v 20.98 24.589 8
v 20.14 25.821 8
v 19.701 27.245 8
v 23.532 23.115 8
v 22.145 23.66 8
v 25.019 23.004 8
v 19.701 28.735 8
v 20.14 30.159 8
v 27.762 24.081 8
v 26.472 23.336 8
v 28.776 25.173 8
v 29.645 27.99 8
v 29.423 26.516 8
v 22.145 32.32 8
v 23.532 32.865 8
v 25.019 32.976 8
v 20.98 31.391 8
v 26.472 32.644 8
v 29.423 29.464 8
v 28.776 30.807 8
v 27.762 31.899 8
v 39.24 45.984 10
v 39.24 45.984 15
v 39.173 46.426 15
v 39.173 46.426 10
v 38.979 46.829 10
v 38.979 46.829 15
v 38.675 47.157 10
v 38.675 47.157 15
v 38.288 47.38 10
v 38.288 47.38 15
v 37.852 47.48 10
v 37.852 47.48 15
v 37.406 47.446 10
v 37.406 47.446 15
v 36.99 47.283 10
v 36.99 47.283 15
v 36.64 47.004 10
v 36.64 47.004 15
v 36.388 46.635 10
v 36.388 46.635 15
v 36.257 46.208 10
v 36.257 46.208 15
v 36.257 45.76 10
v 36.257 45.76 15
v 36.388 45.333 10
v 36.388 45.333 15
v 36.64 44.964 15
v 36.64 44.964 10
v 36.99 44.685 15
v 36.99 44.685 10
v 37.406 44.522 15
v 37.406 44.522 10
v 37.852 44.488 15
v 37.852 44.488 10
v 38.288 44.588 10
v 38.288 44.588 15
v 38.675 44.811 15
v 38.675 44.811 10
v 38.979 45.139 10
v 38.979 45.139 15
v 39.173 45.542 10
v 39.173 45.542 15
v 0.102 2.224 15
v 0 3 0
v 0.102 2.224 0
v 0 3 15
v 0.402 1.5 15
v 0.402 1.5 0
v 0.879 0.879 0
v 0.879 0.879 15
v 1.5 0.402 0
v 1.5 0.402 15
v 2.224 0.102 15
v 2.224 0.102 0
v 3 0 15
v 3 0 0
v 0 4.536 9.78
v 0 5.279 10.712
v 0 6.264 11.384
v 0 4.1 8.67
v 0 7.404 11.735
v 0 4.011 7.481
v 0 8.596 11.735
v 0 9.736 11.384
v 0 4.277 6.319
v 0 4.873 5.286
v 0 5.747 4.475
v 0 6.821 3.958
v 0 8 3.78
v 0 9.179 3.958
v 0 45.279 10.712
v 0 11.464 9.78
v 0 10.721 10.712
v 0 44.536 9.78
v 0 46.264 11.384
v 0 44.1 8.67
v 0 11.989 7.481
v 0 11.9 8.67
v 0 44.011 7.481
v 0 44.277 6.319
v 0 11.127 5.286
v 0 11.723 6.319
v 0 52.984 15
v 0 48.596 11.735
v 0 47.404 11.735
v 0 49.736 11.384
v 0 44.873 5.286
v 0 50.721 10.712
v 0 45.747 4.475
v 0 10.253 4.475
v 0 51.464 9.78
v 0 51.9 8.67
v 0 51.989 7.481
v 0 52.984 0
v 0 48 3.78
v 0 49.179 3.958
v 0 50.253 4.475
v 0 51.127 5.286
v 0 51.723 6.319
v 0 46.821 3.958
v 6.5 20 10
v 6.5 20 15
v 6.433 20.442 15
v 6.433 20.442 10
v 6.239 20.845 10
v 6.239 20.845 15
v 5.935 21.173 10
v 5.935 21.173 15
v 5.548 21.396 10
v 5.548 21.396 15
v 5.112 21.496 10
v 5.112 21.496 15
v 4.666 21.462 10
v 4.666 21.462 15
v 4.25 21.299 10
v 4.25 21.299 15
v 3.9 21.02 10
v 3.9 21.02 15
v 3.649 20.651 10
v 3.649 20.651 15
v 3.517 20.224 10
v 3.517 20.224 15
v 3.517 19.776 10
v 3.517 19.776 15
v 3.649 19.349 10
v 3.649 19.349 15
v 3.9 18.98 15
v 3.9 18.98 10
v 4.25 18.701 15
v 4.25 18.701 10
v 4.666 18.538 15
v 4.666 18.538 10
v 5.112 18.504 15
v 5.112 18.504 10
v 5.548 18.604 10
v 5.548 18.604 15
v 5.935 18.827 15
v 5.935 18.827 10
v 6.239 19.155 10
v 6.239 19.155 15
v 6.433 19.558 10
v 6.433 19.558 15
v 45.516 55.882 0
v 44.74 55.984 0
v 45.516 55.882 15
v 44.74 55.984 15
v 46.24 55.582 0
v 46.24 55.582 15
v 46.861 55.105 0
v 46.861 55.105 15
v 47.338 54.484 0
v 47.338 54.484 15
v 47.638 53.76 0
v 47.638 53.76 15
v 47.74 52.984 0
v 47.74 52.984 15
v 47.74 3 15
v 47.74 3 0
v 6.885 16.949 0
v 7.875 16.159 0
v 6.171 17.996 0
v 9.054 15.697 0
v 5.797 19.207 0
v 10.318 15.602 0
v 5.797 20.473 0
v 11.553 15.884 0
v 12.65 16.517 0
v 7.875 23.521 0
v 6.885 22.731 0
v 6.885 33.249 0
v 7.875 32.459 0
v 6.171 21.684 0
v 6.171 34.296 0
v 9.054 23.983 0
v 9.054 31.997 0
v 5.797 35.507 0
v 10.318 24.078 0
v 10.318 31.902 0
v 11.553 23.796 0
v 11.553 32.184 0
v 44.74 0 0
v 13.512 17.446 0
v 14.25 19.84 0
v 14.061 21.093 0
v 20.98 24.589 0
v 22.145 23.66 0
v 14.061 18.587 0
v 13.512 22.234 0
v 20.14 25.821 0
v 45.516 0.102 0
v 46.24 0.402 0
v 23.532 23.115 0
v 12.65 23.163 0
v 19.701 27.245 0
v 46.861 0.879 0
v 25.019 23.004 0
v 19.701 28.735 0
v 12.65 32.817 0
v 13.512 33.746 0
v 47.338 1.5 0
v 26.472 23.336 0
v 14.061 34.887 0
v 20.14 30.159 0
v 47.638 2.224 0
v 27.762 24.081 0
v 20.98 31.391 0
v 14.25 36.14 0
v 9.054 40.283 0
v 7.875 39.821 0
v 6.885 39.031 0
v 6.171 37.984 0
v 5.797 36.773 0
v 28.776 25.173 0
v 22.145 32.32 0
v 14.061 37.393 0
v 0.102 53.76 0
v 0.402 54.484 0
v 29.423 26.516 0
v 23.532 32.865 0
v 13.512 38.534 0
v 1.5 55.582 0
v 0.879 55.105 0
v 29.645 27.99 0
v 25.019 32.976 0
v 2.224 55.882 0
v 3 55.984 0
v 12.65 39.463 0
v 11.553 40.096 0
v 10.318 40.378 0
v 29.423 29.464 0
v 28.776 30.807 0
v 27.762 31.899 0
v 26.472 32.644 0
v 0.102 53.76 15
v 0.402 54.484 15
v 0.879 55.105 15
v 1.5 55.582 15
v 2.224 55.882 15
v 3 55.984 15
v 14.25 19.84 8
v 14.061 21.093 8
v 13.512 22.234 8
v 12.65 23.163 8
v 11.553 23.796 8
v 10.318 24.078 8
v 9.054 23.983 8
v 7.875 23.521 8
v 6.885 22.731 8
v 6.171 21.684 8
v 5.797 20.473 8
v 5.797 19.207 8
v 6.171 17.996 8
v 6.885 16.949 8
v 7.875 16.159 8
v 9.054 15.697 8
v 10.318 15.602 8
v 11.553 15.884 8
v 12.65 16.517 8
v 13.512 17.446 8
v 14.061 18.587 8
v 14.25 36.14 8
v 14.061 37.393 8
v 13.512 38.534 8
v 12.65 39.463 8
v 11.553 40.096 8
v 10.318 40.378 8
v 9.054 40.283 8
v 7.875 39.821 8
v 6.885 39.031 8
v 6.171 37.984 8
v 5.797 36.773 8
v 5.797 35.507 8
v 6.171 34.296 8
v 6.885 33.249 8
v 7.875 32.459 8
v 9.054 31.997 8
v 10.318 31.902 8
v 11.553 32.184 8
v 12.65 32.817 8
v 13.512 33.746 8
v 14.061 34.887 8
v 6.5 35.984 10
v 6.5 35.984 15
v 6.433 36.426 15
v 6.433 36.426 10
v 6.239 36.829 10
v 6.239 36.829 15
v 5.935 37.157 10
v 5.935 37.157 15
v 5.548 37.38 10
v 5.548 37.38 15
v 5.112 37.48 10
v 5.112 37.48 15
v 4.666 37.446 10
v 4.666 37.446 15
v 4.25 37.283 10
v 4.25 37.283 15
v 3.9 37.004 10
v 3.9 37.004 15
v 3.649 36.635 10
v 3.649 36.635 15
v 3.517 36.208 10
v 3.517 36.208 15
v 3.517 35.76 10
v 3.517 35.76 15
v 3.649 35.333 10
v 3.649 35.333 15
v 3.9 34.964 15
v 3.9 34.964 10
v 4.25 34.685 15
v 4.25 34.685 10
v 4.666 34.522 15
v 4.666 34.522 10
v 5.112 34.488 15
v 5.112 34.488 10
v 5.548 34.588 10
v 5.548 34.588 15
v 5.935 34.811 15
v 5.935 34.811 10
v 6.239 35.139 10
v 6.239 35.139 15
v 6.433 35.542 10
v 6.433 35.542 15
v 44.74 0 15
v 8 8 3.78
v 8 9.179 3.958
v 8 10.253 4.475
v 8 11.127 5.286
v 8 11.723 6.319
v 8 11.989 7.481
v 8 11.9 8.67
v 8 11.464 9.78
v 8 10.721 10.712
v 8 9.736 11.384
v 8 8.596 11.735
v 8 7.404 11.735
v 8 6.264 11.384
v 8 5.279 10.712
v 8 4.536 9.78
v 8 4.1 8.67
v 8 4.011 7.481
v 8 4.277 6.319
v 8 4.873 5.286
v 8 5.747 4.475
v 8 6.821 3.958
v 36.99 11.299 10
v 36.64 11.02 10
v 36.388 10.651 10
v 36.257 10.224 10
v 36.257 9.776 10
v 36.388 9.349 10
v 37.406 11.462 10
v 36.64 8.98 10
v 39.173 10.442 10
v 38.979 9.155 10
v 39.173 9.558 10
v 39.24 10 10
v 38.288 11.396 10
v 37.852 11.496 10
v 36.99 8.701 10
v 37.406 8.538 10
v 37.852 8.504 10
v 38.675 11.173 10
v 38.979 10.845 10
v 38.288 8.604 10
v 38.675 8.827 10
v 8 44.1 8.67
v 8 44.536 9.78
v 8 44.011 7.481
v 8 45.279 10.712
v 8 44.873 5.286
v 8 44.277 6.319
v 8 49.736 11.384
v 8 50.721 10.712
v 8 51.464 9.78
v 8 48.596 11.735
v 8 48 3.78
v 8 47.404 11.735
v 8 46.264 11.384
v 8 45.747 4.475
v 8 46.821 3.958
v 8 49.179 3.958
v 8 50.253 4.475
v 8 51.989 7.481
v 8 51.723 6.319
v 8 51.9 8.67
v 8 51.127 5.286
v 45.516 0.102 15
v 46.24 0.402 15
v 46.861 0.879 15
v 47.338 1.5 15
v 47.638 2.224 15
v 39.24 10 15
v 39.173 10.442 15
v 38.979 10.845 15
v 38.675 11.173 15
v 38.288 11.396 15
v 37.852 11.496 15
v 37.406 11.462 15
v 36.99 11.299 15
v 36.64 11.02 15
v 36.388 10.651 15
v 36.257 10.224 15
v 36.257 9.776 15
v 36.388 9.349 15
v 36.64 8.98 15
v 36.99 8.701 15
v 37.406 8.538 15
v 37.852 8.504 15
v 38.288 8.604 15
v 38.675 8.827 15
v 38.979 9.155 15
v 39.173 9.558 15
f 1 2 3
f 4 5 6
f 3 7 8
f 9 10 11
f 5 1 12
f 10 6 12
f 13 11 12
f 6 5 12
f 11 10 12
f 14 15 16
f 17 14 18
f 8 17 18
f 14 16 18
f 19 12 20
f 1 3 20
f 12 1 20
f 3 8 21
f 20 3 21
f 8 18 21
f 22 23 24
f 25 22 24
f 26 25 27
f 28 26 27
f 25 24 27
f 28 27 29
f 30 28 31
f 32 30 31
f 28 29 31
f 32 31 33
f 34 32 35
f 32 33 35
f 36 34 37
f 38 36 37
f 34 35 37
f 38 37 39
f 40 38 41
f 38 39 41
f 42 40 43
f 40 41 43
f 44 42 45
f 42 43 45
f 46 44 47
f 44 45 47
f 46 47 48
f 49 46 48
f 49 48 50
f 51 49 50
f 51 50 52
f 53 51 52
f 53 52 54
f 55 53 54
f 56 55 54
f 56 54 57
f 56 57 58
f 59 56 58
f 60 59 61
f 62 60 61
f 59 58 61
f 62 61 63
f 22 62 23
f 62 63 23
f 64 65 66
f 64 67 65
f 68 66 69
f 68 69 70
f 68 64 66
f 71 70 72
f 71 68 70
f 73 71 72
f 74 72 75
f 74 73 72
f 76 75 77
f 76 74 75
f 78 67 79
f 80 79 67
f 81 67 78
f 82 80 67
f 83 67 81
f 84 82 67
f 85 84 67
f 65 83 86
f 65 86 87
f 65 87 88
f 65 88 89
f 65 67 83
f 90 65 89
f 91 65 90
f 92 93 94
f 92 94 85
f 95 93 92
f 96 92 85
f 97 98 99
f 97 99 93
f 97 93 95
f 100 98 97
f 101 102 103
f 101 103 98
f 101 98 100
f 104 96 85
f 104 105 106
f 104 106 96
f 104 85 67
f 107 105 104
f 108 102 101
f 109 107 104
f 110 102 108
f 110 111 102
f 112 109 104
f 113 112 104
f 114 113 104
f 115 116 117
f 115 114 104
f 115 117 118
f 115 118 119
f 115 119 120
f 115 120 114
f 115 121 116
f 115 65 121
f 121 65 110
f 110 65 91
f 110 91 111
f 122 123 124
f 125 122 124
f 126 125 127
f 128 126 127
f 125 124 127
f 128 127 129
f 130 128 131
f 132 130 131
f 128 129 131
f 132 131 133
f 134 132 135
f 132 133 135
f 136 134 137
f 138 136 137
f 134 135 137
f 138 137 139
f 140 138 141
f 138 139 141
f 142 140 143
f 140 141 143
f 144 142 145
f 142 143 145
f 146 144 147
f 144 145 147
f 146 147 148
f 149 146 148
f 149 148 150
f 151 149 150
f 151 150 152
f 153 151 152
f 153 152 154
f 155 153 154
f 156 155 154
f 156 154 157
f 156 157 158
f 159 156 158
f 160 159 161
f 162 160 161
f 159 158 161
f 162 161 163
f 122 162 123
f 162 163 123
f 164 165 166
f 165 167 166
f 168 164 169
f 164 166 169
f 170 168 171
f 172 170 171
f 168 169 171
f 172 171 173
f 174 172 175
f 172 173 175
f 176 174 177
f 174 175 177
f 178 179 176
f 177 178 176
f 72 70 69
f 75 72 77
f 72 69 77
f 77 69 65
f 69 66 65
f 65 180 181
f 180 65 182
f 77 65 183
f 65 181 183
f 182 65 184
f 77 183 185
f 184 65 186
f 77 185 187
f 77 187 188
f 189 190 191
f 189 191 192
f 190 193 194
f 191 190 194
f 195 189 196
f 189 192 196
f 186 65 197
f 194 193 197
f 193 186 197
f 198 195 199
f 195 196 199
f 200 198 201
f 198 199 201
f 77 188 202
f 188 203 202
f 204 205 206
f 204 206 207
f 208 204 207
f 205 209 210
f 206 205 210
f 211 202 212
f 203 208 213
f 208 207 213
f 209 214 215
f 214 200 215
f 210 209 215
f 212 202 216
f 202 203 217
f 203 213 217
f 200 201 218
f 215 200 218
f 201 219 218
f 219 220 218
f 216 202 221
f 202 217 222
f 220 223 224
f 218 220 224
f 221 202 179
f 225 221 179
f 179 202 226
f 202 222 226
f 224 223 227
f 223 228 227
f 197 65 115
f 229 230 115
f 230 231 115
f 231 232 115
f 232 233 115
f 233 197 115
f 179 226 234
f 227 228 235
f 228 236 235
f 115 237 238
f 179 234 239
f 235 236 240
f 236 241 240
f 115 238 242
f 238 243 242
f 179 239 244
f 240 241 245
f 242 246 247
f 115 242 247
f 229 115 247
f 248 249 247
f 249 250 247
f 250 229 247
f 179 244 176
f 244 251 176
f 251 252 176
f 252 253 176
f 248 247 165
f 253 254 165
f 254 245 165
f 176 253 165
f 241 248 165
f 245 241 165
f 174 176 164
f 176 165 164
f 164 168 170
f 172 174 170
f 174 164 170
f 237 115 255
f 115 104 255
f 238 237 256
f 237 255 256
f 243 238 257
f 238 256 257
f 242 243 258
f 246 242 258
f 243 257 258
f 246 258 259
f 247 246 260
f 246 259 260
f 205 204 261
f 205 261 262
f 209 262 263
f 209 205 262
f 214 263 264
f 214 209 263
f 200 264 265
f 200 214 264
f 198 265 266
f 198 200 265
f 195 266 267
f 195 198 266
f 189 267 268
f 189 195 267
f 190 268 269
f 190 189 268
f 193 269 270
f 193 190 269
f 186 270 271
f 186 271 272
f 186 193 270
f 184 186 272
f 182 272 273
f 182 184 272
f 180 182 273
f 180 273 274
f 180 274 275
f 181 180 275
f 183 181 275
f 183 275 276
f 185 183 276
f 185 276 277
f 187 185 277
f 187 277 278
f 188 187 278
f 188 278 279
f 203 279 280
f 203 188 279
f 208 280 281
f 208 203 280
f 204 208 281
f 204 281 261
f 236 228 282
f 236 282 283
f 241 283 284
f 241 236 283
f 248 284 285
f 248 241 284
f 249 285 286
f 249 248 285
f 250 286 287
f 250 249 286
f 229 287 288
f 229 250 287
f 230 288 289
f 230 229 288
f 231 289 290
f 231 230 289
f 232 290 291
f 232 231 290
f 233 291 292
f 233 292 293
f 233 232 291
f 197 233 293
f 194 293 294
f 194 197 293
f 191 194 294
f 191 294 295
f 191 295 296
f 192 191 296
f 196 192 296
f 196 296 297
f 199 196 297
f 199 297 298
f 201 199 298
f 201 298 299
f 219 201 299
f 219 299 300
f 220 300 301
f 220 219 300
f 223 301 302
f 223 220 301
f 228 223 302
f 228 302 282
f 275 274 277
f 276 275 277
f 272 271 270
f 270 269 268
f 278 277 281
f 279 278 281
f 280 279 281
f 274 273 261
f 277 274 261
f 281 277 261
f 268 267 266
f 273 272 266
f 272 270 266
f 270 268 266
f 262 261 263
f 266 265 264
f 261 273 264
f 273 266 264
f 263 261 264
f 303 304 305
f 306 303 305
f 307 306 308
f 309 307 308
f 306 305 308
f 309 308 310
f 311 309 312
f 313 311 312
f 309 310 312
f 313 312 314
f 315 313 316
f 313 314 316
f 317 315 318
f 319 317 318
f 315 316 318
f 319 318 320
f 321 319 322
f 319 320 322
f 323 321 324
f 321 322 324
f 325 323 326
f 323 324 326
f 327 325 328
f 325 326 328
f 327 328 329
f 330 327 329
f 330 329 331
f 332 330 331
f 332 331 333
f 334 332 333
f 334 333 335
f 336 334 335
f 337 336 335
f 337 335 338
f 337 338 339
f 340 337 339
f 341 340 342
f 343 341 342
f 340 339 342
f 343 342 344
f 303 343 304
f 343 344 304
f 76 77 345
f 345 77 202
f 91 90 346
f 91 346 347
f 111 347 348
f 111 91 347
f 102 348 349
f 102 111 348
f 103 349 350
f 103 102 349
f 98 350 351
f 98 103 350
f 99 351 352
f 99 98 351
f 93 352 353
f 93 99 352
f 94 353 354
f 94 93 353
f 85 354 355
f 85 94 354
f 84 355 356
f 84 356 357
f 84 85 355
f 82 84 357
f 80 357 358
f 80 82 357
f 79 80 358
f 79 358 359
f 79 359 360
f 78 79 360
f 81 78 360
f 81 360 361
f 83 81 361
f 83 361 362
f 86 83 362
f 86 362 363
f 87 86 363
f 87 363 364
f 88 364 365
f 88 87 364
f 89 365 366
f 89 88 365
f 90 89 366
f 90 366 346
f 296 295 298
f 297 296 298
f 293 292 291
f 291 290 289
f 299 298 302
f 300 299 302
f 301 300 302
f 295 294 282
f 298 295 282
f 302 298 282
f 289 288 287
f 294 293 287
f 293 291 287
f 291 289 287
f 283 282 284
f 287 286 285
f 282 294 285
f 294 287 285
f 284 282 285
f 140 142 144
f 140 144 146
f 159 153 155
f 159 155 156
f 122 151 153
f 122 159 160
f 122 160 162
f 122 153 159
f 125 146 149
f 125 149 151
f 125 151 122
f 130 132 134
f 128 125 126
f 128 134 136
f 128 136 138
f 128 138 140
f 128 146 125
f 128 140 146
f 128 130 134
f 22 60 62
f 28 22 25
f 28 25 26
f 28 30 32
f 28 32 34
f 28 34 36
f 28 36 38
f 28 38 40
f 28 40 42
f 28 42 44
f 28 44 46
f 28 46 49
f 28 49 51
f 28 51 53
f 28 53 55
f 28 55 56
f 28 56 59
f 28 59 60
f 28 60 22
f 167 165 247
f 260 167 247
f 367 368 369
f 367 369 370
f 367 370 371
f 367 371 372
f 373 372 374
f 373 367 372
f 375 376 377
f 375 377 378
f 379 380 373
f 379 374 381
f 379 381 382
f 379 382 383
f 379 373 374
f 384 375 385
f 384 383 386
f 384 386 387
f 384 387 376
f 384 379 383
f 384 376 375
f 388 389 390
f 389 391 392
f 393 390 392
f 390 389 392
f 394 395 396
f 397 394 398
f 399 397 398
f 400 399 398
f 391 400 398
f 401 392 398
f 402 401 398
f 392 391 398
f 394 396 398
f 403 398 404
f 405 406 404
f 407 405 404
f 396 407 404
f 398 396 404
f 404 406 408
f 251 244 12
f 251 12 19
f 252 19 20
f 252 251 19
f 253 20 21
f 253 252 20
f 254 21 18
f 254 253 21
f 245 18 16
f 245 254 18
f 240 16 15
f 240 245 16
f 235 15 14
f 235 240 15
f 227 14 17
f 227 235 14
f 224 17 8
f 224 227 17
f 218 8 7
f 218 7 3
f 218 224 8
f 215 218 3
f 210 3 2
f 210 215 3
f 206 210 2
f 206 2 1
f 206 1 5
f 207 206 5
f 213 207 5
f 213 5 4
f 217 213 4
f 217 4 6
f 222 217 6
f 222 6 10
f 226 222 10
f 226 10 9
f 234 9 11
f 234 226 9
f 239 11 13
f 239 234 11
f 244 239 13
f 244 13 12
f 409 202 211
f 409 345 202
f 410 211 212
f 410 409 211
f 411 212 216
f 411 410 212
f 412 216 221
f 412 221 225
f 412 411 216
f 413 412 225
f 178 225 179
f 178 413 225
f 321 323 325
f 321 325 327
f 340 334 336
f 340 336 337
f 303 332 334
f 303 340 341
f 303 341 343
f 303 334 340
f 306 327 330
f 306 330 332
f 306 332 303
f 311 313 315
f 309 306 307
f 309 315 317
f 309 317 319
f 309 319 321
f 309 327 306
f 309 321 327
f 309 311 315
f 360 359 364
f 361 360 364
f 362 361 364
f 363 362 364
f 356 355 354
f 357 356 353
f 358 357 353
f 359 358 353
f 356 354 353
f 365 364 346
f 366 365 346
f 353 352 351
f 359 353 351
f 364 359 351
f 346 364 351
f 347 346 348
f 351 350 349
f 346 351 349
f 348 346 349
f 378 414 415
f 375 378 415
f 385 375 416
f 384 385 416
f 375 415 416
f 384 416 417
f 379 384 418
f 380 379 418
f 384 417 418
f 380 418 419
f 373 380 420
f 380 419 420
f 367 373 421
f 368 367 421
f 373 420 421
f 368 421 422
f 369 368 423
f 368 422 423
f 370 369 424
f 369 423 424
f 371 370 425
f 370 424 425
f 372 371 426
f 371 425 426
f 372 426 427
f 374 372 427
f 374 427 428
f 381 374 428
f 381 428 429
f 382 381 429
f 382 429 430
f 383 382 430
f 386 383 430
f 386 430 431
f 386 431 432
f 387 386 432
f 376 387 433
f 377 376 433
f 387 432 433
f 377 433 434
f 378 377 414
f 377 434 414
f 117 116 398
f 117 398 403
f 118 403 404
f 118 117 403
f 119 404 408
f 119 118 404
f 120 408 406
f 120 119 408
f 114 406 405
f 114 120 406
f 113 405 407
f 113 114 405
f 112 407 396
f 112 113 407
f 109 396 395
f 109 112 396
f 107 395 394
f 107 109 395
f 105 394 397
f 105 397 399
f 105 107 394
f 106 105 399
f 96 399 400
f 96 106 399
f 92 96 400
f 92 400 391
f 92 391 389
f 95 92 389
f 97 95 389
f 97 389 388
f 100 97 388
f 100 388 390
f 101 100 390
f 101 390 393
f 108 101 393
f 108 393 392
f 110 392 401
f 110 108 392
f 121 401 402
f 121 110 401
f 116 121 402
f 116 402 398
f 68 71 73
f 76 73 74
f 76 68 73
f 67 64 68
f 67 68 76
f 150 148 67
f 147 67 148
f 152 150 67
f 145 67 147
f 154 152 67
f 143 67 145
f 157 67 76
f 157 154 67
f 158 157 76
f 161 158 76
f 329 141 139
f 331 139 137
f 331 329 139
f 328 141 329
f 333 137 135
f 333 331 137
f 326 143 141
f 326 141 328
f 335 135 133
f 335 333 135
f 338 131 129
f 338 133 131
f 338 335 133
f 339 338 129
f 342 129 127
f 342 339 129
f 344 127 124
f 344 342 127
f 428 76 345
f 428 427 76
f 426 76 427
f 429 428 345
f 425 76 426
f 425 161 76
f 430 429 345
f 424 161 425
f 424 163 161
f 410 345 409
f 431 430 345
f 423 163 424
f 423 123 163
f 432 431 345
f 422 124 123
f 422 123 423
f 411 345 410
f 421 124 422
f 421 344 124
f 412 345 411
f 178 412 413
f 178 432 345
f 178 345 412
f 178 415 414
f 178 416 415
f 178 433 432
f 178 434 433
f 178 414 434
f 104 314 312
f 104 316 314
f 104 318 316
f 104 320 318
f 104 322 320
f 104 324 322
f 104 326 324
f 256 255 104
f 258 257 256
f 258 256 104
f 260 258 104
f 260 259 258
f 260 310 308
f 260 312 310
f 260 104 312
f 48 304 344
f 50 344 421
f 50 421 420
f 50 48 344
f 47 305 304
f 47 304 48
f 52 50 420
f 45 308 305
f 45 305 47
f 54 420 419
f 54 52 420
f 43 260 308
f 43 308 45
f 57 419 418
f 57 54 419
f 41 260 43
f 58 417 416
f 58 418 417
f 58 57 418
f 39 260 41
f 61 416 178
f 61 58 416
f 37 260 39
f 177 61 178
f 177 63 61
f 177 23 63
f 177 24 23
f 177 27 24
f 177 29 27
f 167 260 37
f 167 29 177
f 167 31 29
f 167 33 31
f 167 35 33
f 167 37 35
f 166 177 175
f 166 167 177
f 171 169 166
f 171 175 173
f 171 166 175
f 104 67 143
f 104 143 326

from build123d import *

# Parameters (mm, degrees)
ESQUISSE1_W             = 50
ESQUISSE1_H             = 60
BOSS_EXTRU_1_DEPTH      = 15
ESQUISSE2_R             = 4.25
ESQUISSE2_R_2           = 5
ENL_V_MAT_EXTRU_1_DEPTH = 8
ESQUISSE4_W             = 2.260138716
ESQUISSE4_H             = 60
ENL_V_MAT_EXTRU_2_DEPTH = 80.529868603
ESQUISSE5_R             = 4
ENL_V_MAT_EXTRU_3_DEPTH = 8
ESQUISSE6_W             = 47.739861284
ESQUISSE6_H             = 4.016031869
ENL_V_MAT_EXTRU_4_DEPTH = 79.128703787
CONG_1_R                = 3
ESQUISSE7_R             = 1.5
ENL_V_MAT_EXTRU_5_DEPTH = 5


with BuildPart() as part:
    # Esquisse1 → Boss.-Extru.1 (new body)
    with BuildSketch(Plane.XY):
        with Locations((25, 30)):
            Rectangle(ESQUISSE1_W, ESQUISSE1_H)
    extrude(amount=BOSS_EXTRU_1_DEPTH)

    # Esquisse2 → Enlèv. mat.-Extru.1 (cut)
    with BuildSketch(Plane.XY):
        with Locations((10, 36.14)):
            Circle(ESQUISSE2_R)
        with Locations((10, 19.84)):
            Circle(ESQUISSE2_R)
        with Locations((24.644968419, 27.99)):
            Circle(ESQUISSE2_R_2)
    extrude(amount=ENL_V_MAT_EXTRU_1_DEPTH, mode=Mode.SUBTRACT)

    # Esquisse4 → Enlèv. mat.-Extru.2 (cut, through all)
    with BuildSketch(Plane.XY):
        with Locations((48.869930642, 30)):
            Rectangle(ESQUISSE4_W, ESQUISSE4_H)
    extrude(amount=ENL_V_MAT_EXTRU_2_DEPTH, mode=Mode.SUBTRACT)

    # Esquisse5 → Enlèv. mat.-Extru.3 (cut)
    with BuildSketch(Plane(origin=(0, 0, 0), x_dir=(0, 0, -1), z_dir=(1, 0, 0))):
        with Locations((-7.779969549, 8)):
            Circle(ESQUISSE5_R)
        with Locations((-7.779969549, 48)):
            Circle(ESQUISSE5_R)
    extrude(amount=ENL_V_MAT_EXTRU_3_DEPTH, mode=Mode.SUBTRACT)

    # Esquisse6 → Enlèv. mat.-Extru.4 (cut, through all)
    with BuildSketch(Plane(origin=(0, 0, 0), x_dir=(-1, 0, 0), z_dir=(0, 0, -1))):
        with Locations((-23.869930642, 57.991984066)):
            Rectangle(ESQUISSE6_W, ESQUISSE6_H)
    extrude(amount=-ENL_V_MAT_EXTRU_4_DEPTH, mode=Mode.SUBTRACT)

    # Congé1
    cong_1_edges = [part.edges().sort_by_distance(p)[0] for p in [
        (47.739861284, 0, 7.5),
        (47.739861284, 55.983968131, 7.5),
        (0, 55.983968131, 7.5),
        (0, 0, 7.5),
    ]]
    fillet(cong_1_edges, radius=CONG_1_R)

    # Esquisse7 → Enlèv. mat.-Extru.5 (cut)
    with BuildSketch(Plane.XY.offset(15)):
        with Locations((37.739861284, 45.983968131)):
            Circle(ESQUISSE7_R)
        with Locations((37.739861284, 10)):
            Circle(ESQUISSE7_R)
        with Locations((5, 20)):
            Circle(ESQUISSE7_R)
        with Locations((5, 35.983968131)):
            Circle(ESQUISSE7_R)
    extrude(amount=-ENL_V_MAT_EXTRU_5_DEPTH, mode=Mode.SUBTRACT)


solid = part.part
